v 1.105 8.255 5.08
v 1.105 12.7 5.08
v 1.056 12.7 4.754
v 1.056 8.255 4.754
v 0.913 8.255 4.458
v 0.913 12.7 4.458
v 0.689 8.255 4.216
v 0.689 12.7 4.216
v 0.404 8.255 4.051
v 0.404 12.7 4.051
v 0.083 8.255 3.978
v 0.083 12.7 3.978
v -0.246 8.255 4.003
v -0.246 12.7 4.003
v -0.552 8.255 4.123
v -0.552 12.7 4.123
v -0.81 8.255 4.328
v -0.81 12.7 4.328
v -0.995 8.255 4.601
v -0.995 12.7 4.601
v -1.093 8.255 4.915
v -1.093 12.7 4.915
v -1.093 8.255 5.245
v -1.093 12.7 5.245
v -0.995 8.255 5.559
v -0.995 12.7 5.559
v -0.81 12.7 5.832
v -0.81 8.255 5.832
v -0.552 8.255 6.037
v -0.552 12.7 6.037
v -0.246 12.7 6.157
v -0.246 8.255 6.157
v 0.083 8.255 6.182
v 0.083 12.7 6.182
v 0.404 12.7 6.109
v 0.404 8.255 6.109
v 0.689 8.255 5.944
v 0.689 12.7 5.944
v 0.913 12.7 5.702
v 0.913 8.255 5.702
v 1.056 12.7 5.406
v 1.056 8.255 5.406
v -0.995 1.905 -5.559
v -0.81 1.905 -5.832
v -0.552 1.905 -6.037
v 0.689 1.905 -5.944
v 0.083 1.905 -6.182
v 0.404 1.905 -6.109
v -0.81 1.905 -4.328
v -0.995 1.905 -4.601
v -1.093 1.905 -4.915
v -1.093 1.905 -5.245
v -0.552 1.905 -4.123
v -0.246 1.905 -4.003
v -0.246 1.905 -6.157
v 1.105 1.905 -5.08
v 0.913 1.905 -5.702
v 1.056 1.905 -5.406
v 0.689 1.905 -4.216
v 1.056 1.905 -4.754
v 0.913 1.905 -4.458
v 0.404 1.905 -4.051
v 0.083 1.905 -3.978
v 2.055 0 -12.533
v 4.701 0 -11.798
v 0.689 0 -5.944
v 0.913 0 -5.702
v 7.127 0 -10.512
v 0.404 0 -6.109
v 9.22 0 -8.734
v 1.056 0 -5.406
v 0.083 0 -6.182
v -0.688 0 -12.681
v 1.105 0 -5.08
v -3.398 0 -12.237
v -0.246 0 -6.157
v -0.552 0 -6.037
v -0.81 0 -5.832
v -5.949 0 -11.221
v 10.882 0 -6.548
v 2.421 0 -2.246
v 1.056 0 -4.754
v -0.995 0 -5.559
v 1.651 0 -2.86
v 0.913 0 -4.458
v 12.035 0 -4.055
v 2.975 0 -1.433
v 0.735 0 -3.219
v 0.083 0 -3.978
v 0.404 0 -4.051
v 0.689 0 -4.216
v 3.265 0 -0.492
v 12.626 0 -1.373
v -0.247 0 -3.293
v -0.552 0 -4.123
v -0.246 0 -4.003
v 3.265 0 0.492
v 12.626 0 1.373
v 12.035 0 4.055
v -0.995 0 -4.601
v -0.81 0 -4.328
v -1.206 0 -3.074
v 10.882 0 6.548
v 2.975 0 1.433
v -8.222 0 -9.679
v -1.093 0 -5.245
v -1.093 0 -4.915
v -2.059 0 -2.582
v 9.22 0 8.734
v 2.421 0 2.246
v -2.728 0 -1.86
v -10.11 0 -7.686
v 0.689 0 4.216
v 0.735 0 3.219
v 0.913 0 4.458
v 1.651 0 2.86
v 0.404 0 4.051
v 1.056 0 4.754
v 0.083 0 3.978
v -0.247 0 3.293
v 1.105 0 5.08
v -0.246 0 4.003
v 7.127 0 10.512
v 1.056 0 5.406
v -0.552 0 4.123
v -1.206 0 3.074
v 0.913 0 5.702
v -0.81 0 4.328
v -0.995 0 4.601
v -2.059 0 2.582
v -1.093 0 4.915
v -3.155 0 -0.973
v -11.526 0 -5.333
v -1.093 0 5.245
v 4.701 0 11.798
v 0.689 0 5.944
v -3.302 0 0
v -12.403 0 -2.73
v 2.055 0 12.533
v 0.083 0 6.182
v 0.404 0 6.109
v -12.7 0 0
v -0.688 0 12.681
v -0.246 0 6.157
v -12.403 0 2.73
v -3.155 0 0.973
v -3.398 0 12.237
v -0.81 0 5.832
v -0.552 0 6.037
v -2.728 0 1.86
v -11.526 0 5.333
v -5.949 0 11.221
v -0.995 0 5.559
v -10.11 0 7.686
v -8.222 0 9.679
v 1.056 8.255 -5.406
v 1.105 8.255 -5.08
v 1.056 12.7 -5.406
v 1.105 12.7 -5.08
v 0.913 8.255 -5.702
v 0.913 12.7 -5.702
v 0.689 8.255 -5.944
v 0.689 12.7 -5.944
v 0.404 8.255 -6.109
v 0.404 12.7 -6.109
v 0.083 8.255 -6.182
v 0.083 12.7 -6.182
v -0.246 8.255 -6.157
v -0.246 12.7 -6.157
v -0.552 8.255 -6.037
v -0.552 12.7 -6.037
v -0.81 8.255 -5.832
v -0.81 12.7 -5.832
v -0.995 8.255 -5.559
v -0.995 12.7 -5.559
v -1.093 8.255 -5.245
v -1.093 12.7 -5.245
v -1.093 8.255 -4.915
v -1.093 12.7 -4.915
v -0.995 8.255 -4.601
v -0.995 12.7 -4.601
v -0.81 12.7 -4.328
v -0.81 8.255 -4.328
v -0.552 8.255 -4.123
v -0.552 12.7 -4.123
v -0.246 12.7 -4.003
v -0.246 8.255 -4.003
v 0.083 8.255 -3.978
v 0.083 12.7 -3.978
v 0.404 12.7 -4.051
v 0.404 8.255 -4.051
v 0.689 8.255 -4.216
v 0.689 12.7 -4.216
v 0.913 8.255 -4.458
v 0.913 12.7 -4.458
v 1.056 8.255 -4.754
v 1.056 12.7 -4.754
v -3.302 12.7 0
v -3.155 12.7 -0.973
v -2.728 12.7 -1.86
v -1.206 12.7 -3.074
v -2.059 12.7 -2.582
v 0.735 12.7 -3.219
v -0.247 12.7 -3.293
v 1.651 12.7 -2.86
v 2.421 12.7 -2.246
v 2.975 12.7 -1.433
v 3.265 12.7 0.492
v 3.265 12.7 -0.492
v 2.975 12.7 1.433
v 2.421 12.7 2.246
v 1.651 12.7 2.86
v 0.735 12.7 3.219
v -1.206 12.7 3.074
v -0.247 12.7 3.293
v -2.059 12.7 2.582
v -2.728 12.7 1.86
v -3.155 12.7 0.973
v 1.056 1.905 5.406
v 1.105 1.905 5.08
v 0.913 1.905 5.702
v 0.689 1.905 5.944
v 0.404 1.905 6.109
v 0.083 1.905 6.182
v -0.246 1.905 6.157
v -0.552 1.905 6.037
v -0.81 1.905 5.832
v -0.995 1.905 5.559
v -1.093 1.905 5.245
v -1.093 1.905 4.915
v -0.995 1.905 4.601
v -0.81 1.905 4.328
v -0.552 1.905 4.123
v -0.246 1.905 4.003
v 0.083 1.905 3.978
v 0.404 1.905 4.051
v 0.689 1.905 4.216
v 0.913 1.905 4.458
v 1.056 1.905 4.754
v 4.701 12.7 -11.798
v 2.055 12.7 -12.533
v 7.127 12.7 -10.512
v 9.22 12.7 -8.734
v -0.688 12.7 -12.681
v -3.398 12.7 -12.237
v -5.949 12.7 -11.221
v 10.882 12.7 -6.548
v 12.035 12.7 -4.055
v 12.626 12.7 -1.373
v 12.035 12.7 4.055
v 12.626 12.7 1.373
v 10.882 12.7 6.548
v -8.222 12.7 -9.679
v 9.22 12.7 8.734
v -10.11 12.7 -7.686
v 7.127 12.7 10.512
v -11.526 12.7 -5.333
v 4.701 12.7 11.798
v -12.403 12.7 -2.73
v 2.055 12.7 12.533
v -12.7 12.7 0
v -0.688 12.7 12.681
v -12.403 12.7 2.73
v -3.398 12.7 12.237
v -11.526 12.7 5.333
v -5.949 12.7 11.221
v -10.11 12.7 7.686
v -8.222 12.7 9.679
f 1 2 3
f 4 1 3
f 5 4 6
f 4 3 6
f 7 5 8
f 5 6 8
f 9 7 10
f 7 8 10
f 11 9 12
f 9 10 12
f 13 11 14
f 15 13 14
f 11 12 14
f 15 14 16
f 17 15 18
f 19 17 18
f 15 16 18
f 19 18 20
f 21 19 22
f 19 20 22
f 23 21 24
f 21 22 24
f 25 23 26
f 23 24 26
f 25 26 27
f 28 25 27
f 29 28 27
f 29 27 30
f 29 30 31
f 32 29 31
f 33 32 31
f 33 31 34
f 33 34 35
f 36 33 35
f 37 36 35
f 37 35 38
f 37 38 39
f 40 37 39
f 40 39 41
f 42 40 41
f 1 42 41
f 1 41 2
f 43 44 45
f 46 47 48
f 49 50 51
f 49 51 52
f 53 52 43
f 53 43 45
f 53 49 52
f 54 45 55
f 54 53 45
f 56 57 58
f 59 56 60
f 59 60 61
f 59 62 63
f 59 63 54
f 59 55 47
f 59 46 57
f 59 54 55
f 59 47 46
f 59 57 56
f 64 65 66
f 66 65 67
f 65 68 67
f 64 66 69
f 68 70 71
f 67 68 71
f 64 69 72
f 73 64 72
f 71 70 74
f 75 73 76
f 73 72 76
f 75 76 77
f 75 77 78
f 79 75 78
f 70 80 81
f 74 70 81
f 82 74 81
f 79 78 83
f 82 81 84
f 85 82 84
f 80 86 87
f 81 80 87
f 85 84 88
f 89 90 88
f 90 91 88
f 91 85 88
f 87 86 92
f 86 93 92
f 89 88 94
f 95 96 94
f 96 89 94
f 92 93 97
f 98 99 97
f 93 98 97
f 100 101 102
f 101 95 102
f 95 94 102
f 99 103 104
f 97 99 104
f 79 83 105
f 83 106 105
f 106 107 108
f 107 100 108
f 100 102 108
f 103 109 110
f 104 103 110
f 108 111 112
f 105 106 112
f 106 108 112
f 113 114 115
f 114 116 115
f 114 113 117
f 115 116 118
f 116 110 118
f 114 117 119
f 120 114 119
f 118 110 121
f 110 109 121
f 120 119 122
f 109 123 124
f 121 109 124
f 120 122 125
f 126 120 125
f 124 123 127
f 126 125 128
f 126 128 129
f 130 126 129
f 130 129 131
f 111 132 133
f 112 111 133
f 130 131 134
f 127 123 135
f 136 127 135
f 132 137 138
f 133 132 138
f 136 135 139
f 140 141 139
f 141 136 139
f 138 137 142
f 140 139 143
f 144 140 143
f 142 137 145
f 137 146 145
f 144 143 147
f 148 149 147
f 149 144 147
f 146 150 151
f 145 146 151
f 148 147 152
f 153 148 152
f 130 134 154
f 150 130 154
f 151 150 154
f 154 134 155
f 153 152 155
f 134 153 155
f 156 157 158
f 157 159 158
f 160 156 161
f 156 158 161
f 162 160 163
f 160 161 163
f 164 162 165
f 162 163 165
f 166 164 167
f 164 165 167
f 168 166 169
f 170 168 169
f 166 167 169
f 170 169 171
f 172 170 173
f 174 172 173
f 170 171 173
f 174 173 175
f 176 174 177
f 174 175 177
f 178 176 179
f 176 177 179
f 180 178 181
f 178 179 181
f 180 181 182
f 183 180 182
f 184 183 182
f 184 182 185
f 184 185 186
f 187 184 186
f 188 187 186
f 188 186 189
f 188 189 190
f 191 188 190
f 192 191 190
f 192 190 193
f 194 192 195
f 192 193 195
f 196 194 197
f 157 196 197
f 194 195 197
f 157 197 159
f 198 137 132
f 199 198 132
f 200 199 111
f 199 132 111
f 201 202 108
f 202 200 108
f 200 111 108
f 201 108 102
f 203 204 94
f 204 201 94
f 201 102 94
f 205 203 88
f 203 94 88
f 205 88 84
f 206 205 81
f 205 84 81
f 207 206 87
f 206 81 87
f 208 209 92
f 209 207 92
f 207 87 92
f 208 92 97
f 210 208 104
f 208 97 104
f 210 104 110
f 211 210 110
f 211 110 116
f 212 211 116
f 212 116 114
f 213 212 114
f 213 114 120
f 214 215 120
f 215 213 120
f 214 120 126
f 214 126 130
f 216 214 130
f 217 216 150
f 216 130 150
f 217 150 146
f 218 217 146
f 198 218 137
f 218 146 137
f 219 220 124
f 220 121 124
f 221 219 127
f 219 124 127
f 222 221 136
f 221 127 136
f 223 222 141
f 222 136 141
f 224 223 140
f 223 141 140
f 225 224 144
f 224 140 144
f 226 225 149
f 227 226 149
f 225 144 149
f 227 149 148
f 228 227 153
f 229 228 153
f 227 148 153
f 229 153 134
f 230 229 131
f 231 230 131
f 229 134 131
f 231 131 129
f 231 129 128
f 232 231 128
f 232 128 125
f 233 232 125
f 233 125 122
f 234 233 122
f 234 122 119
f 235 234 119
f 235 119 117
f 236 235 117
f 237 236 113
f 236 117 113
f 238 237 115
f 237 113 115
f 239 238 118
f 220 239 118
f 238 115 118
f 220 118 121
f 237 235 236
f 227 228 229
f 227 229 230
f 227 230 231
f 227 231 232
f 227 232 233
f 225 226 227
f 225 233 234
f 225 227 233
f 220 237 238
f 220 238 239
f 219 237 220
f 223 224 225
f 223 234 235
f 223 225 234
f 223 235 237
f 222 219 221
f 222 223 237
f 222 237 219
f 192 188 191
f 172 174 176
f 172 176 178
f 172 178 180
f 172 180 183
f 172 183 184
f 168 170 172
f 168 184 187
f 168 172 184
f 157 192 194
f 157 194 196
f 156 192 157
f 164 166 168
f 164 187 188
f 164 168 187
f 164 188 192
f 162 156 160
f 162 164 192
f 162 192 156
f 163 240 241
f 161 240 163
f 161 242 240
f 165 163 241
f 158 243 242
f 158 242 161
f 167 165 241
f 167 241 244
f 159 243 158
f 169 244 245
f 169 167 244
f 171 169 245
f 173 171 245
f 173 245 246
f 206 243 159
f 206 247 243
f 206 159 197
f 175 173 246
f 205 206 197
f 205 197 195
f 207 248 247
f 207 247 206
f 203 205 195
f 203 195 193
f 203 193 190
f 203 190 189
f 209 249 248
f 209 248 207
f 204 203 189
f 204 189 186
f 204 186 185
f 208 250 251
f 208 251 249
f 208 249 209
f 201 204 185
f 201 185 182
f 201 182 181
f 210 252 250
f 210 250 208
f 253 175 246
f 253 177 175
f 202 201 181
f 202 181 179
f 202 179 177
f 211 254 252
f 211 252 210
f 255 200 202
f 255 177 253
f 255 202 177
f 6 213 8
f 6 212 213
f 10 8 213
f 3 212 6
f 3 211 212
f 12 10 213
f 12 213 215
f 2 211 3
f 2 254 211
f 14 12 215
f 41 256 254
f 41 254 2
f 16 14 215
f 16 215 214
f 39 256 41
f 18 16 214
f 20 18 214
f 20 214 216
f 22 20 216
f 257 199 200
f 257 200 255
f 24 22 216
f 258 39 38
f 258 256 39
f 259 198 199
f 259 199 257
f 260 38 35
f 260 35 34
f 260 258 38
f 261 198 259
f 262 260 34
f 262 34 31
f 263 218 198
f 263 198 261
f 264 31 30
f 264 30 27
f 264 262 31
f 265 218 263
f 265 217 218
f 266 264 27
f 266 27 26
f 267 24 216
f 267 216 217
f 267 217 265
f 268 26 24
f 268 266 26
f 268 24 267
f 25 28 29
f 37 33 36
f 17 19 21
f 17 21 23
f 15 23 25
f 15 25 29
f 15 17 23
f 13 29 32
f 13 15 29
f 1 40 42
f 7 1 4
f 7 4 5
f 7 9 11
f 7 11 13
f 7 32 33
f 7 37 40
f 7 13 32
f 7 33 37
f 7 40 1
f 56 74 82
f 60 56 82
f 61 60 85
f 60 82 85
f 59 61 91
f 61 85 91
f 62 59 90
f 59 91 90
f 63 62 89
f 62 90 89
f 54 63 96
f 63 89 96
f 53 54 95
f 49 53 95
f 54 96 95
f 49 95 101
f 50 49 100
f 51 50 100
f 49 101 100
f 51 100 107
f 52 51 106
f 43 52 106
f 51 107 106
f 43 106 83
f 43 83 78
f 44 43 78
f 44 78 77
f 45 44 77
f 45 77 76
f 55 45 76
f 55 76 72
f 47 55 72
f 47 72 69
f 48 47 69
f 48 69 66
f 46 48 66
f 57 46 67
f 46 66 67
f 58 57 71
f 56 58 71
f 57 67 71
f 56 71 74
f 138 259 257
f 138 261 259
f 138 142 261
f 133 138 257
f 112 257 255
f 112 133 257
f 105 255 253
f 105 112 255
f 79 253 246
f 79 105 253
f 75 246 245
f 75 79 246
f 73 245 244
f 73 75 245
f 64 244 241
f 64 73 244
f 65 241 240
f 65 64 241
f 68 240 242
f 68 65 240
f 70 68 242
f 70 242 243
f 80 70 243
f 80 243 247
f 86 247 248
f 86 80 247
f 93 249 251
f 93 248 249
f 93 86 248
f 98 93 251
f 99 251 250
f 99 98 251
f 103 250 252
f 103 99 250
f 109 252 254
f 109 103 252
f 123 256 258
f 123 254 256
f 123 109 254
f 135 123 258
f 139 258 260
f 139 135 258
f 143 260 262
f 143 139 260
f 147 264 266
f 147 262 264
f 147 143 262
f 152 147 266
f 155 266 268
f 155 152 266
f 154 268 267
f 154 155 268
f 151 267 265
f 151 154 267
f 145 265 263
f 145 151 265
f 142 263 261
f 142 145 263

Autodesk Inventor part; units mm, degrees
ref_plane "YZ Plane" through (0, 0, 0) normal (1, 0, 0) x (0, 1, 0)
ref_plane "XZ Plane" through (0, 0, 0) normal (0, 1, 0) x (-1, 0, 0)
ref_plane "XY Plane" through (0, 0, 0) normal (0, 0, 1) x (1, 0, 0)
sketch "Sketch1" plane through (0, 0, 0) normal (0, 1, 0) x (-1, 0, 0)
  circle A0 centre (0, 0) radius 12.7
  circle A1 centre (0, 0) radius 3.302
  dimension "d0" = 25.4
  dimension "d1" = 6.604
extrude "Extrusion1" add sketch "Sketch1" along normal blind 12.7
sketch "Sketch2" plane through (0, 12.7, 0) normal (0, 1, 0) x (1, 0, 0)
  line L0 (0, 0) -> (0, -5.08)
  line L1 (0, -5.08) -> (0, 0)
  line L2 (0, 0) -> (0, 5.08)
  circle A0 centre (0, -5.08) radius 1.1049
  circle A1 centre (0, 5.08) radius 1.1049
  dimension "d4" = 5.08
  dimension "d5" = 5.08
  dimension "d6" = 2.2098
  dimension "d7" = 2.2098
extrude "Extrusion2" cut sketch "Sketch2" against normal blind 4.445
sketch "Sketch3" plane through (0, 0, 0) normal (0, -1, 0) x (1, 0, 0)
  line L0 (0, 0) -> (0, 5.08)
  line L1 (0, 5.08) -> (0, -5.08)
  circle A0 centre (0, 5.08) radius 1.1049
  circle A1 centre (0, -5.08) radius 1.1049
  dimension "d10" = 5.08
  dimension "d11" = 10.16
  dimension "d14" = 2.2098
  dimension "d15" = 2.2098
extrude "Extrusion3" cut sketch "Sketch3" against normal blind 1.905
properties part number "PolarisPost_HeightAdjustment_0p5in_smallholesfrom0p79to0p81"
